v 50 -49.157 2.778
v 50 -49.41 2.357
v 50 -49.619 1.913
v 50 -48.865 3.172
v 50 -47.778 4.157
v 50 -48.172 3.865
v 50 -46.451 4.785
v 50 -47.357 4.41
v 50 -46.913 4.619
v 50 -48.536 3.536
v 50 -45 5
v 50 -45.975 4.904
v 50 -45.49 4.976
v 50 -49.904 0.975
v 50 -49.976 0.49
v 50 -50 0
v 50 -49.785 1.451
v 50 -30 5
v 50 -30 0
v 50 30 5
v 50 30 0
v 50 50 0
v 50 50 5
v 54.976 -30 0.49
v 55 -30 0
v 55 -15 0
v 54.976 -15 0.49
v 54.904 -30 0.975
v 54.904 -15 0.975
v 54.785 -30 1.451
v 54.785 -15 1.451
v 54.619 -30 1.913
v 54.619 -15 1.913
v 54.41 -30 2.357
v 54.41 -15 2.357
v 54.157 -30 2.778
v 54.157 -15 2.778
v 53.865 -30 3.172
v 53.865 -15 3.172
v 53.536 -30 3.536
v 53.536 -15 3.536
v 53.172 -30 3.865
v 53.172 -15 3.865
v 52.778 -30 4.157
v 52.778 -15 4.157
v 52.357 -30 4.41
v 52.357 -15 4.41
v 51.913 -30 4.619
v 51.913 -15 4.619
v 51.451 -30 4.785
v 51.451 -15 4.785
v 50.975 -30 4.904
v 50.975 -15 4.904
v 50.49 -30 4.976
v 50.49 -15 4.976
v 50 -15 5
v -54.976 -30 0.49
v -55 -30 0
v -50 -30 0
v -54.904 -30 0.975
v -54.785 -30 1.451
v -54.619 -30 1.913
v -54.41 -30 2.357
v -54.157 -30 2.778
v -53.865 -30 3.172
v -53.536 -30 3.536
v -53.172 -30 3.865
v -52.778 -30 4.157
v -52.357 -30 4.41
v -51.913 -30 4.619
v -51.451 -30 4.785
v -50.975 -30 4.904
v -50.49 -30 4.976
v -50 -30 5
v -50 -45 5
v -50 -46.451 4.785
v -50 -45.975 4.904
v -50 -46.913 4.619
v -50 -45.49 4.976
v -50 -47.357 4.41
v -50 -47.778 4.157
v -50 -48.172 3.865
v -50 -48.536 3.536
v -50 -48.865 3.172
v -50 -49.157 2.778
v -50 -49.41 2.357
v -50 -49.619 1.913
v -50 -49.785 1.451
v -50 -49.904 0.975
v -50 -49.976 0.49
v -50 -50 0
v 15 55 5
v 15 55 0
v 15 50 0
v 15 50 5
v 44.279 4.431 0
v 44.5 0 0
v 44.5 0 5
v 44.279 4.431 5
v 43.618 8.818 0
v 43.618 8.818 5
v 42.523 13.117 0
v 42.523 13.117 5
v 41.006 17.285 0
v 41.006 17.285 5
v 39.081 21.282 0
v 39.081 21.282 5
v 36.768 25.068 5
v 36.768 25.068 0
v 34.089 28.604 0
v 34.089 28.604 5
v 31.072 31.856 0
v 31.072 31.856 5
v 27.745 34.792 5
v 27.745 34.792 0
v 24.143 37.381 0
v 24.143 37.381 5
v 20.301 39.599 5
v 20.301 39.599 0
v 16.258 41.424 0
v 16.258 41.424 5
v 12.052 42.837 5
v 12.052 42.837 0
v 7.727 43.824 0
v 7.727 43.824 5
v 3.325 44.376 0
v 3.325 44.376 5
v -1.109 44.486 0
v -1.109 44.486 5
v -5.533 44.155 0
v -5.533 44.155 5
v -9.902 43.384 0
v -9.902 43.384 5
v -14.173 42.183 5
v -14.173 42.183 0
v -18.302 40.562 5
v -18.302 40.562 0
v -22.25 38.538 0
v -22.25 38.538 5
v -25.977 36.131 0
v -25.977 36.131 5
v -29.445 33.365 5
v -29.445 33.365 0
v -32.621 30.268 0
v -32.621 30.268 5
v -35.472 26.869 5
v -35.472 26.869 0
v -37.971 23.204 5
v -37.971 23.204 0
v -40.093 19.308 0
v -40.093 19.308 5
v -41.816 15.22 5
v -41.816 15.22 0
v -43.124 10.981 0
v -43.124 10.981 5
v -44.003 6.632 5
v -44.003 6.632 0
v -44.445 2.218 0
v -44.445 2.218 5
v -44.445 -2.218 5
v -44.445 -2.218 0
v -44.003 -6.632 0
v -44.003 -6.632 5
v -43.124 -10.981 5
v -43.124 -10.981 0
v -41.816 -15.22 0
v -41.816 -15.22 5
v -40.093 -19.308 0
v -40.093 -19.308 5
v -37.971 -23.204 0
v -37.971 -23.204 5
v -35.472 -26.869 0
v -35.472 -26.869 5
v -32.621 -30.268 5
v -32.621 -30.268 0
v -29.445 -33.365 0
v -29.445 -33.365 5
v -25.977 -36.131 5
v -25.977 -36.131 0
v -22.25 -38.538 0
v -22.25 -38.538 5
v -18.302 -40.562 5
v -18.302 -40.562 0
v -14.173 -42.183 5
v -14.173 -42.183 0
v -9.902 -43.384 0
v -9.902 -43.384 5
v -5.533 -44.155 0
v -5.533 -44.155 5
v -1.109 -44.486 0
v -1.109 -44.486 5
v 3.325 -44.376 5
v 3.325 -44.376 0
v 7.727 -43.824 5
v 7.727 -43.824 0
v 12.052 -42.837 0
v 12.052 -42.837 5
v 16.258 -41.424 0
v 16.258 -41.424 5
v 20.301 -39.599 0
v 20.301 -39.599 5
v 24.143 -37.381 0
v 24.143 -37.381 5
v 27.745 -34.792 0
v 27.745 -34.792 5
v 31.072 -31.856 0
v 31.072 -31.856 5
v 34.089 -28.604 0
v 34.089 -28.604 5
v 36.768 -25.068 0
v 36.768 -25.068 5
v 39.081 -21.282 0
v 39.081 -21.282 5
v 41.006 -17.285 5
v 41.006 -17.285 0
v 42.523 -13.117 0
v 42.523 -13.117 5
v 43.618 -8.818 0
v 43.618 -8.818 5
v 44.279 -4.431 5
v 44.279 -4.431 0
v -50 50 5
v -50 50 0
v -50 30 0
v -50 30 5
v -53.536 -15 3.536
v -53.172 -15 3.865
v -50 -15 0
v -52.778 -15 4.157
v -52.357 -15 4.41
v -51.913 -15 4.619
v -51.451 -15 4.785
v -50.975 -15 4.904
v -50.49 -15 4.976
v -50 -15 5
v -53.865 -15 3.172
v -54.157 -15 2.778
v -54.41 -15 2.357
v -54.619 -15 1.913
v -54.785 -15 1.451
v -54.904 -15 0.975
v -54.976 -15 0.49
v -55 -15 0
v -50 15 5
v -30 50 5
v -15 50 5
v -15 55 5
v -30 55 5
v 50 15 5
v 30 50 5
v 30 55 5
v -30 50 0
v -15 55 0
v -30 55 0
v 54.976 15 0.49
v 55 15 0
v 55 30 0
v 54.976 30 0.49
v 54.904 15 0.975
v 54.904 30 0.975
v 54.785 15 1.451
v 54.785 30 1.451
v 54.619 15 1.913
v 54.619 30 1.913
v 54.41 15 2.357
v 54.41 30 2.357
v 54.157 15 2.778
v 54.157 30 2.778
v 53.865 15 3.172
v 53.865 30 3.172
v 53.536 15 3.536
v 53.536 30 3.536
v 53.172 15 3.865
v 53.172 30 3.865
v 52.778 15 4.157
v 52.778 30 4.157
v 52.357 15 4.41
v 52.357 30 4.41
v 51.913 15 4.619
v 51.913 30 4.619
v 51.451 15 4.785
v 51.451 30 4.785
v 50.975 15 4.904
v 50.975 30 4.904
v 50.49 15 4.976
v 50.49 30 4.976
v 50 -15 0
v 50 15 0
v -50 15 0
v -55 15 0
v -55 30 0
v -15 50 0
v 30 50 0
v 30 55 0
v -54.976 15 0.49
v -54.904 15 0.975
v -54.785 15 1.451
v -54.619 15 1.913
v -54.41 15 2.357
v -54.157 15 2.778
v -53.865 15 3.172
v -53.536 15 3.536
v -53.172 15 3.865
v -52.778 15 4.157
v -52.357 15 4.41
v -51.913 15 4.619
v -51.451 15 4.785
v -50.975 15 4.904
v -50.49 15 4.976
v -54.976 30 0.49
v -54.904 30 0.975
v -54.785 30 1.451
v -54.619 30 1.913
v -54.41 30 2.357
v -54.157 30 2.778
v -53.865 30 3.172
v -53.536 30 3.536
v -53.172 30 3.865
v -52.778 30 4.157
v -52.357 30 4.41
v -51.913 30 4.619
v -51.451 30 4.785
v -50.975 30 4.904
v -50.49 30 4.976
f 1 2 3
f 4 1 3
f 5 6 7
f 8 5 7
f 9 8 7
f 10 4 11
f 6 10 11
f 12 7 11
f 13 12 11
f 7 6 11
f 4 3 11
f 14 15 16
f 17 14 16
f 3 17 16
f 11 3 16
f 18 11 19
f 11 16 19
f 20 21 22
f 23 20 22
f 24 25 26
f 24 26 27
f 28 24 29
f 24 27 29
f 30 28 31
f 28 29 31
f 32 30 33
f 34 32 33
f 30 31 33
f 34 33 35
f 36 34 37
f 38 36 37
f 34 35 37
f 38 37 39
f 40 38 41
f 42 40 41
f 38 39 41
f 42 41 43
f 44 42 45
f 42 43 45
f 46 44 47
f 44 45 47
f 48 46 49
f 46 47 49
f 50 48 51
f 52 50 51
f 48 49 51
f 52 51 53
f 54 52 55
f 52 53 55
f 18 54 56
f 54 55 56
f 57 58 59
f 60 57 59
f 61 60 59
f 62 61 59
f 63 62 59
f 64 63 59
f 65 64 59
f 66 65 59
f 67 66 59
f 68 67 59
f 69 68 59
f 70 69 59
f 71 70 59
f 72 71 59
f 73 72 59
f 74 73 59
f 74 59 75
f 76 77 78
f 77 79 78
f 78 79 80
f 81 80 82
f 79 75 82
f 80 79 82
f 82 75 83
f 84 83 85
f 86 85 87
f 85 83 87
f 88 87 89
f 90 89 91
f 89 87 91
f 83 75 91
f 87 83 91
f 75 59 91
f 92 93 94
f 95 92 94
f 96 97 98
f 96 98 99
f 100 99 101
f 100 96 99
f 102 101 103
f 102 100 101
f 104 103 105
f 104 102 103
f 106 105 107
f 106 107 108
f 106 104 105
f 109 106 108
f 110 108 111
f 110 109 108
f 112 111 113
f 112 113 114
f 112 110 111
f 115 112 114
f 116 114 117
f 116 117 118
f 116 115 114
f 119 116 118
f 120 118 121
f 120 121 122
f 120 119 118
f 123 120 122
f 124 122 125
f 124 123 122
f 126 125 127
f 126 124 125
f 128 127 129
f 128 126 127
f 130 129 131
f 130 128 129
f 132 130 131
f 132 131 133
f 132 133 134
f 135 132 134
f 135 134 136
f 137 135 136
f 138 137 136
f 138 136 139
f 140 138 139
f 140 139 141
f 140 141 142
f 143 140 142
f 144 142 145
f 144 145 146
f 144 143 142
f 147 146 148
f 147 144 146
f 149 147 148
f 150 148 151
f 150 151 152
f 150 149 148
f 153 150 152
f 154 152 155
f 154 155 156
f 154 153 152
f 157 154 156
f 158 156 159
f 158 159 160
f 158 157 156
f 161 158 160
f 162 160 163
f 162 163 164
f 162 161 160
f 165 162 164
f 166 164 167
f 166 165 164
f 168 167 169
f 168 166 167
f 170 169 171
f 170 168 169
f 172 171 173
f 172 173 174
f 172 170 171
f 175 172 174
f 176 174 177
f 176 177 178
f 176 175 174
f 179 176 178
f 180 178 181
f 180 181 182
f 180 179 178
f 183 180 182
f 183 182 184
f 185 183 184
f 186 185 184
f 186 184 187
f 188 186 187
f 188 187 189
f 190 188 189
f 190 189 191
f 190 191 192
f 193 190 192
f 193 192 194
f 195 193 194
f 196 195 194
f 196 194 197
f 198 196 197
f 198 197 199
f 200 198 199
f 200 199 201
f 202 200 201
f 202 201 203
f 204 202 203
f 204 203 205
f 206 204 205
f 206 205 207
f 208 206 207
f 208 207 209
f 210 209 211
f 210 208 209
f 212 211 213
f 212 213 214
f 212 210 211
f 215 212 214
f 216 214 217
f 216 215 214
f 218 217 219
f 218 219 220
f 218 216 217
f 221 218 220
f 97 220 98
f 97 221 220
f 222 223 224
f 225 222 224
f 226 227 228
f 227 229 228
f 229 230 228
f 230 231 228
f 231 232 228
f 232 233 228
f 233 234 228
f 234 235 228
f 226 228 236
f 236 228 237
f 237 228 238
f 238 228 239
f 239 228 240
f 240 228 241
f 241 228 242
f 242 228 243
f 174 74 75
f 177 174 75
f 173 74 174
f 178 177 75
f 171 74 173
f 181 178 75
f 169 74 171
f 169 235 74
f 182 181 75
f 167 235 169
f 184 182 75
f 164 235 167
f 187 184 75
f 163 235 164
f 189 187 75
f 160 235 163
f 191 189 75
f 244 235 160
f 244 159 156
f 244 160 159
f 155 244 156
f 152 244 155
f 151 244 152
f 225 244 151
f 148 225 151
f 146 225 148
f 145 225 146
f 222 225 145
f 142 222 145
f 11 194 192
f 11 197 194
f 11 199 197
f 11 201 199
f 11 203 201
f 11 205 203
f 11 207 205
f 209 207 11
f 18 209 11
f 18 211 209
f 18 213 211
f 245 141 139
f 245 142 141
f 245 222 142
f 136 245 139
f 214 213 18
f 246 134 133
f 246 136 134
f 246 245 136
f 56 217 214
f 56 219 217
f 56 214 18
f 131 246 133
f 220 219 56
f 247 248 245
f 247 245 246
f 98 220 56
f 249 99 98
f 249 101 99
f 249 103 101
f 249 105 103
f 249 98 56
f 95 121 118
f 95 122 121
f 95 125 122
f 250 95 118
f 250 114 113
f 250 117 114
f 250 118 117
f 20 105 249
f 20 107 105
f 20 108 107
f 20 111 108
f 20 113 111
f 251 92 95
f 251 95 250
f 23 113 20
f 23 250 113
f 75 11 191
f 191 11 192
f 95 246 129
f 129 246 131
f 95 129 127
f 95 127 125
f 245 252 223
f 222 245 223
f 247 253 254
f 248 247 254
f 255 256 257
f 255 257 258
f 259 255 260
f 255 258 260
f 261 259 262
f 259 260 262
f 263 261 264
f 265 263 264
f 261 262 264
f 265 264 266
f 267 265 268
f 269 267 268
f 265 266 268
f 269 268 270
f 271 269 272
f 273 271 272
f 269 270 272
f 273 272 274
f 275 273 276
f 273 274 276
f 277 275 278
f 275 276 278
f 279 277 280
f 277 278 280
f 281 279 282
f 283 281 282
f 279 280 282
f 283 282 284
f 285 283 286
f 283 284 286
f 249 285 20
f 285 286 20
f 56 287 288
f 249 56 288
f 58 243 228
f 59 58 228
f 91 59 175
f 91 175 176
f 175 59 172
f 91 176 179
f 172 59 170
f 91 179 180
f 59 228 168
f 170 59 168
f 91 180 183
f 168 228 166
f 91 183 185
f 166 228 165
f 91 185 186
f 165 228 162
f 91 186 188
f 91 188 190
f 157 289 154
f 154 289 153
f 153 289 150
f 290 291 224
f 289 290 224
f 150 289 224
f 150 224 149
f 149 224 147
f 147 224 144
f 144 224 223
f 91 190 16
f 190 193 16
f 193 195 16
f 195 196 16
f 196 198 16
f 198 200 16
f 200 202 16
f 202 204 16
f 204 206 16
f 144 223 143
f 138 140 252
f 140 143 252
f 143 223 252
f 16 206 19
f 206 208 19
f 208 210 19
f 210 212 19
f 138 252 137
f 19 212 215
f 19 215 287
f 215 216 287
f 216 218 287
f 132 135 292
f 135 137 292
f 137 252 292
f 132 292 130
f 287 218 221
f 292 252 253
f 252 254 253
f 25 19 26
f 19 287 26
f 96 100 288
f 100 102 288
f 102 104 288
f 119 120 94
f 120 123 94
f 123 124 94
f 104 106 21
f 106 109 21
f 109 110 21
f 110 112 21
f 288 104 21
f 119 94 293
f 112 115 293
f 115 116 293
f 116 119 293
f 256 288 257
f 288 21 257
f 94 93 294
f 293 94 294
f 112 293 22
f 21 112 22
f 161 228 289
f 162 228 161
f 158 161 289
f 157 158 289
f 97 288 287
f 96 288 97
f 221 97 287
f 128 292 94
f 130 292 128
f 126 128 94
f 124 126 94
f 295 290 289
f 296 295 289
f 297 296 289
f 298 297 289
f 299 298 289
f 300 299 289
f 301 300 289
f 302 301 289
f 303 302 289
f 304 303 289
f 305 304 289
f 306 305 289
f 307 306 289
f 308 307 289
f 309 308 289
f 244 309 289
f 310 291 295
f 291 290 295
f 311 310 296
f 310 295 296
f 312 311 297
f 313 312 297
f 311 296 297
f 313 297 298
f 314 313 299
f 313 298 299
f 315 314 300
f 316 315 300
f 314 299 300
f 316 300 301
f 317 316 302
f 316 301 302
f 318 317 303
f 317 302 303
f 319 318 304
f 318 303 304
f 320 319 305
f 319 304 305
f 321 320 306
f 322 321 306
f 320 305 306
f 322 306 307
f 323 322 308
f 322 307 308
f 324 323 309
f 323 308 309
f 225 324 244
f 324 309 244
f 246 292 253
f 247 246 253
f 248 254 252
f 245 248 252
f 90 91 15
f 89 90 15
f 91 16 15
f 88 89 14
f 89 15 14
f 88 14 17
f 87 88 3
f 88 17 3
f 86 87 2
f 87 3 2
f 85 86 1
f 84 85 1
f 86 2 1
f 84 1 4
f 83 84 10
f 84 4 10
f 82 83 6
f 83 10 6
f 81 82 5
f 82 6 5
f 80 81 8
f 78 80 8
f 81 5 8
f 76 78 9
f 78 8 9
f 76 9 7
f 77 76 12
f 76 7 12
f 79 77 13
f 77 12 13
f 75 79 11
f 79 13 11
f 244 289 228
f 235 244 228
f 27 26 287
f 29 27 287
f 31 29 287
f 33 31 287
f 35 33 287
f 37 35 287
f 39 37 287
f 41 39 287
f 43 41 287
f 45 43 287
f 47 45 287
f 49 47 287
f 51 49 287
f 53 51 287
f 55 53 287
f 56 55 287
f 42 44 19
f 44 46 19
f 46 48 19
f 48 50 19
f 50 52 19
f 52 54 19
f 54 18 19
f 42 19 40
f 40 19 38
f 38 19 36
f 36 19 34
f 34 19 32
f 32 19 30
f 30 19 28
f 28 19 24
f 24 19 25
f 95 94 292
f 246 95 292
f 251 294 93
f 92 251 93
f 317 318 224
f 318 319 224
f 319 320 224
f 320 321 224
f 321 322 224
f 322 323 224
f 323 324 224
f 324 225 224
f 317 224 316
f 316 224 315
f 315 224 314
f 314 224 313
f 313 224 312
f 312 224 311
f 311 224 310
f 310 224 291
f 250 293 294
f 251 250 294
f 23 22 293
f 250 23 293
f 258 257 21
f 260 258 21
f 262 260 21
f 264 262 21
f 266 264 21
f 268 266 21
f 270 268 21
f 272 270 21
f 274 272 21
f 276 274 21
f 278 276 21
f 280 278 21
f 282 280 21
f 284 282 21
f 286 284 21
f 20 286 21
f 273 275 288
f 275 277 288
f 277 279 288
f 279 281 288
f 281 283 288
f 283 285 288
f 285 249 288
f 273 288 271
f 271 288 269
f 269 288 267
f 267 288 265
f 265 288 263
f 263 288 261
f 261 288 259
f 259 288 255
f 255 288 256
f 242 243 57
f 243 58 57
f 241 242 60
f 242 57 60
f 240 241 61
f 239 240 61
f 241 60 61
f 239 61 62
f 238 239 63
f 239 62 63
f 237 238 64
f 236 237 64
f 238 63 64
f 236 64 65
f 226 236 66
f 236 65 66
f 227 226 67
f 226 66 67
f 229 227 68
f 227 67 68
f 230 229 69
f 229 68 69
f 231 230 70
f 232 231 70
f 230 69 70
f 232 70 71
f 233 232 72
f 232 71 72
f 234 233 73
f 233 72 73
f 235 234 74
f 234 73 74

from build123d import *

# Parameters (mm, degrees)
F0_R     = 44.5
F1_DEPTH = 5
F2_R     = 4.99999


# Not quite as in the source:
# - a fillet or chamfer is up to 0.001 mm smaller than in the source, because OpenCascade refuses the exact size


with BuildPart() as f1:
    # F0 (on Top) → F1 (new body)
    with BuildSketch(Plane.XY):
        Polygon((-30, 50), (-50, 50), (-50, 30), (-55, 30), (-55, 15), (-50, 15), (-50, -15), (-55, -15), (-55, -30), (-50, -30), (-50, -50), (50, -50), (50, -30), (55, -30), (55, -15), (50, -15), (50, 15), (55, 15), (55, 30), (50, 30), (50, 50), (30, 50), (30, 55), (15, 55), (15, 50), (-15, 50), (-15, 55), (-30, 55), align=None)
        Circle(F0_R, mode=Mode.SUBTRACT)
    extrude(amount=F1_DEPTH)

    # F2 (radius 5 in the source; OpenCascade refuses exactly that, so slightly less here)
    f2_edges = [f1.edges().sort_by_distance(p)[0] for p in [
        (0, -50, 5),
        (55, -22.5, 5),
        (55, 22.5, 5),
        (-55, 22.5, 5),
        (-55, -22.5, 5),
    ]]
    fillet(f2_edges, radius=F2_R)


solid = f1.part
